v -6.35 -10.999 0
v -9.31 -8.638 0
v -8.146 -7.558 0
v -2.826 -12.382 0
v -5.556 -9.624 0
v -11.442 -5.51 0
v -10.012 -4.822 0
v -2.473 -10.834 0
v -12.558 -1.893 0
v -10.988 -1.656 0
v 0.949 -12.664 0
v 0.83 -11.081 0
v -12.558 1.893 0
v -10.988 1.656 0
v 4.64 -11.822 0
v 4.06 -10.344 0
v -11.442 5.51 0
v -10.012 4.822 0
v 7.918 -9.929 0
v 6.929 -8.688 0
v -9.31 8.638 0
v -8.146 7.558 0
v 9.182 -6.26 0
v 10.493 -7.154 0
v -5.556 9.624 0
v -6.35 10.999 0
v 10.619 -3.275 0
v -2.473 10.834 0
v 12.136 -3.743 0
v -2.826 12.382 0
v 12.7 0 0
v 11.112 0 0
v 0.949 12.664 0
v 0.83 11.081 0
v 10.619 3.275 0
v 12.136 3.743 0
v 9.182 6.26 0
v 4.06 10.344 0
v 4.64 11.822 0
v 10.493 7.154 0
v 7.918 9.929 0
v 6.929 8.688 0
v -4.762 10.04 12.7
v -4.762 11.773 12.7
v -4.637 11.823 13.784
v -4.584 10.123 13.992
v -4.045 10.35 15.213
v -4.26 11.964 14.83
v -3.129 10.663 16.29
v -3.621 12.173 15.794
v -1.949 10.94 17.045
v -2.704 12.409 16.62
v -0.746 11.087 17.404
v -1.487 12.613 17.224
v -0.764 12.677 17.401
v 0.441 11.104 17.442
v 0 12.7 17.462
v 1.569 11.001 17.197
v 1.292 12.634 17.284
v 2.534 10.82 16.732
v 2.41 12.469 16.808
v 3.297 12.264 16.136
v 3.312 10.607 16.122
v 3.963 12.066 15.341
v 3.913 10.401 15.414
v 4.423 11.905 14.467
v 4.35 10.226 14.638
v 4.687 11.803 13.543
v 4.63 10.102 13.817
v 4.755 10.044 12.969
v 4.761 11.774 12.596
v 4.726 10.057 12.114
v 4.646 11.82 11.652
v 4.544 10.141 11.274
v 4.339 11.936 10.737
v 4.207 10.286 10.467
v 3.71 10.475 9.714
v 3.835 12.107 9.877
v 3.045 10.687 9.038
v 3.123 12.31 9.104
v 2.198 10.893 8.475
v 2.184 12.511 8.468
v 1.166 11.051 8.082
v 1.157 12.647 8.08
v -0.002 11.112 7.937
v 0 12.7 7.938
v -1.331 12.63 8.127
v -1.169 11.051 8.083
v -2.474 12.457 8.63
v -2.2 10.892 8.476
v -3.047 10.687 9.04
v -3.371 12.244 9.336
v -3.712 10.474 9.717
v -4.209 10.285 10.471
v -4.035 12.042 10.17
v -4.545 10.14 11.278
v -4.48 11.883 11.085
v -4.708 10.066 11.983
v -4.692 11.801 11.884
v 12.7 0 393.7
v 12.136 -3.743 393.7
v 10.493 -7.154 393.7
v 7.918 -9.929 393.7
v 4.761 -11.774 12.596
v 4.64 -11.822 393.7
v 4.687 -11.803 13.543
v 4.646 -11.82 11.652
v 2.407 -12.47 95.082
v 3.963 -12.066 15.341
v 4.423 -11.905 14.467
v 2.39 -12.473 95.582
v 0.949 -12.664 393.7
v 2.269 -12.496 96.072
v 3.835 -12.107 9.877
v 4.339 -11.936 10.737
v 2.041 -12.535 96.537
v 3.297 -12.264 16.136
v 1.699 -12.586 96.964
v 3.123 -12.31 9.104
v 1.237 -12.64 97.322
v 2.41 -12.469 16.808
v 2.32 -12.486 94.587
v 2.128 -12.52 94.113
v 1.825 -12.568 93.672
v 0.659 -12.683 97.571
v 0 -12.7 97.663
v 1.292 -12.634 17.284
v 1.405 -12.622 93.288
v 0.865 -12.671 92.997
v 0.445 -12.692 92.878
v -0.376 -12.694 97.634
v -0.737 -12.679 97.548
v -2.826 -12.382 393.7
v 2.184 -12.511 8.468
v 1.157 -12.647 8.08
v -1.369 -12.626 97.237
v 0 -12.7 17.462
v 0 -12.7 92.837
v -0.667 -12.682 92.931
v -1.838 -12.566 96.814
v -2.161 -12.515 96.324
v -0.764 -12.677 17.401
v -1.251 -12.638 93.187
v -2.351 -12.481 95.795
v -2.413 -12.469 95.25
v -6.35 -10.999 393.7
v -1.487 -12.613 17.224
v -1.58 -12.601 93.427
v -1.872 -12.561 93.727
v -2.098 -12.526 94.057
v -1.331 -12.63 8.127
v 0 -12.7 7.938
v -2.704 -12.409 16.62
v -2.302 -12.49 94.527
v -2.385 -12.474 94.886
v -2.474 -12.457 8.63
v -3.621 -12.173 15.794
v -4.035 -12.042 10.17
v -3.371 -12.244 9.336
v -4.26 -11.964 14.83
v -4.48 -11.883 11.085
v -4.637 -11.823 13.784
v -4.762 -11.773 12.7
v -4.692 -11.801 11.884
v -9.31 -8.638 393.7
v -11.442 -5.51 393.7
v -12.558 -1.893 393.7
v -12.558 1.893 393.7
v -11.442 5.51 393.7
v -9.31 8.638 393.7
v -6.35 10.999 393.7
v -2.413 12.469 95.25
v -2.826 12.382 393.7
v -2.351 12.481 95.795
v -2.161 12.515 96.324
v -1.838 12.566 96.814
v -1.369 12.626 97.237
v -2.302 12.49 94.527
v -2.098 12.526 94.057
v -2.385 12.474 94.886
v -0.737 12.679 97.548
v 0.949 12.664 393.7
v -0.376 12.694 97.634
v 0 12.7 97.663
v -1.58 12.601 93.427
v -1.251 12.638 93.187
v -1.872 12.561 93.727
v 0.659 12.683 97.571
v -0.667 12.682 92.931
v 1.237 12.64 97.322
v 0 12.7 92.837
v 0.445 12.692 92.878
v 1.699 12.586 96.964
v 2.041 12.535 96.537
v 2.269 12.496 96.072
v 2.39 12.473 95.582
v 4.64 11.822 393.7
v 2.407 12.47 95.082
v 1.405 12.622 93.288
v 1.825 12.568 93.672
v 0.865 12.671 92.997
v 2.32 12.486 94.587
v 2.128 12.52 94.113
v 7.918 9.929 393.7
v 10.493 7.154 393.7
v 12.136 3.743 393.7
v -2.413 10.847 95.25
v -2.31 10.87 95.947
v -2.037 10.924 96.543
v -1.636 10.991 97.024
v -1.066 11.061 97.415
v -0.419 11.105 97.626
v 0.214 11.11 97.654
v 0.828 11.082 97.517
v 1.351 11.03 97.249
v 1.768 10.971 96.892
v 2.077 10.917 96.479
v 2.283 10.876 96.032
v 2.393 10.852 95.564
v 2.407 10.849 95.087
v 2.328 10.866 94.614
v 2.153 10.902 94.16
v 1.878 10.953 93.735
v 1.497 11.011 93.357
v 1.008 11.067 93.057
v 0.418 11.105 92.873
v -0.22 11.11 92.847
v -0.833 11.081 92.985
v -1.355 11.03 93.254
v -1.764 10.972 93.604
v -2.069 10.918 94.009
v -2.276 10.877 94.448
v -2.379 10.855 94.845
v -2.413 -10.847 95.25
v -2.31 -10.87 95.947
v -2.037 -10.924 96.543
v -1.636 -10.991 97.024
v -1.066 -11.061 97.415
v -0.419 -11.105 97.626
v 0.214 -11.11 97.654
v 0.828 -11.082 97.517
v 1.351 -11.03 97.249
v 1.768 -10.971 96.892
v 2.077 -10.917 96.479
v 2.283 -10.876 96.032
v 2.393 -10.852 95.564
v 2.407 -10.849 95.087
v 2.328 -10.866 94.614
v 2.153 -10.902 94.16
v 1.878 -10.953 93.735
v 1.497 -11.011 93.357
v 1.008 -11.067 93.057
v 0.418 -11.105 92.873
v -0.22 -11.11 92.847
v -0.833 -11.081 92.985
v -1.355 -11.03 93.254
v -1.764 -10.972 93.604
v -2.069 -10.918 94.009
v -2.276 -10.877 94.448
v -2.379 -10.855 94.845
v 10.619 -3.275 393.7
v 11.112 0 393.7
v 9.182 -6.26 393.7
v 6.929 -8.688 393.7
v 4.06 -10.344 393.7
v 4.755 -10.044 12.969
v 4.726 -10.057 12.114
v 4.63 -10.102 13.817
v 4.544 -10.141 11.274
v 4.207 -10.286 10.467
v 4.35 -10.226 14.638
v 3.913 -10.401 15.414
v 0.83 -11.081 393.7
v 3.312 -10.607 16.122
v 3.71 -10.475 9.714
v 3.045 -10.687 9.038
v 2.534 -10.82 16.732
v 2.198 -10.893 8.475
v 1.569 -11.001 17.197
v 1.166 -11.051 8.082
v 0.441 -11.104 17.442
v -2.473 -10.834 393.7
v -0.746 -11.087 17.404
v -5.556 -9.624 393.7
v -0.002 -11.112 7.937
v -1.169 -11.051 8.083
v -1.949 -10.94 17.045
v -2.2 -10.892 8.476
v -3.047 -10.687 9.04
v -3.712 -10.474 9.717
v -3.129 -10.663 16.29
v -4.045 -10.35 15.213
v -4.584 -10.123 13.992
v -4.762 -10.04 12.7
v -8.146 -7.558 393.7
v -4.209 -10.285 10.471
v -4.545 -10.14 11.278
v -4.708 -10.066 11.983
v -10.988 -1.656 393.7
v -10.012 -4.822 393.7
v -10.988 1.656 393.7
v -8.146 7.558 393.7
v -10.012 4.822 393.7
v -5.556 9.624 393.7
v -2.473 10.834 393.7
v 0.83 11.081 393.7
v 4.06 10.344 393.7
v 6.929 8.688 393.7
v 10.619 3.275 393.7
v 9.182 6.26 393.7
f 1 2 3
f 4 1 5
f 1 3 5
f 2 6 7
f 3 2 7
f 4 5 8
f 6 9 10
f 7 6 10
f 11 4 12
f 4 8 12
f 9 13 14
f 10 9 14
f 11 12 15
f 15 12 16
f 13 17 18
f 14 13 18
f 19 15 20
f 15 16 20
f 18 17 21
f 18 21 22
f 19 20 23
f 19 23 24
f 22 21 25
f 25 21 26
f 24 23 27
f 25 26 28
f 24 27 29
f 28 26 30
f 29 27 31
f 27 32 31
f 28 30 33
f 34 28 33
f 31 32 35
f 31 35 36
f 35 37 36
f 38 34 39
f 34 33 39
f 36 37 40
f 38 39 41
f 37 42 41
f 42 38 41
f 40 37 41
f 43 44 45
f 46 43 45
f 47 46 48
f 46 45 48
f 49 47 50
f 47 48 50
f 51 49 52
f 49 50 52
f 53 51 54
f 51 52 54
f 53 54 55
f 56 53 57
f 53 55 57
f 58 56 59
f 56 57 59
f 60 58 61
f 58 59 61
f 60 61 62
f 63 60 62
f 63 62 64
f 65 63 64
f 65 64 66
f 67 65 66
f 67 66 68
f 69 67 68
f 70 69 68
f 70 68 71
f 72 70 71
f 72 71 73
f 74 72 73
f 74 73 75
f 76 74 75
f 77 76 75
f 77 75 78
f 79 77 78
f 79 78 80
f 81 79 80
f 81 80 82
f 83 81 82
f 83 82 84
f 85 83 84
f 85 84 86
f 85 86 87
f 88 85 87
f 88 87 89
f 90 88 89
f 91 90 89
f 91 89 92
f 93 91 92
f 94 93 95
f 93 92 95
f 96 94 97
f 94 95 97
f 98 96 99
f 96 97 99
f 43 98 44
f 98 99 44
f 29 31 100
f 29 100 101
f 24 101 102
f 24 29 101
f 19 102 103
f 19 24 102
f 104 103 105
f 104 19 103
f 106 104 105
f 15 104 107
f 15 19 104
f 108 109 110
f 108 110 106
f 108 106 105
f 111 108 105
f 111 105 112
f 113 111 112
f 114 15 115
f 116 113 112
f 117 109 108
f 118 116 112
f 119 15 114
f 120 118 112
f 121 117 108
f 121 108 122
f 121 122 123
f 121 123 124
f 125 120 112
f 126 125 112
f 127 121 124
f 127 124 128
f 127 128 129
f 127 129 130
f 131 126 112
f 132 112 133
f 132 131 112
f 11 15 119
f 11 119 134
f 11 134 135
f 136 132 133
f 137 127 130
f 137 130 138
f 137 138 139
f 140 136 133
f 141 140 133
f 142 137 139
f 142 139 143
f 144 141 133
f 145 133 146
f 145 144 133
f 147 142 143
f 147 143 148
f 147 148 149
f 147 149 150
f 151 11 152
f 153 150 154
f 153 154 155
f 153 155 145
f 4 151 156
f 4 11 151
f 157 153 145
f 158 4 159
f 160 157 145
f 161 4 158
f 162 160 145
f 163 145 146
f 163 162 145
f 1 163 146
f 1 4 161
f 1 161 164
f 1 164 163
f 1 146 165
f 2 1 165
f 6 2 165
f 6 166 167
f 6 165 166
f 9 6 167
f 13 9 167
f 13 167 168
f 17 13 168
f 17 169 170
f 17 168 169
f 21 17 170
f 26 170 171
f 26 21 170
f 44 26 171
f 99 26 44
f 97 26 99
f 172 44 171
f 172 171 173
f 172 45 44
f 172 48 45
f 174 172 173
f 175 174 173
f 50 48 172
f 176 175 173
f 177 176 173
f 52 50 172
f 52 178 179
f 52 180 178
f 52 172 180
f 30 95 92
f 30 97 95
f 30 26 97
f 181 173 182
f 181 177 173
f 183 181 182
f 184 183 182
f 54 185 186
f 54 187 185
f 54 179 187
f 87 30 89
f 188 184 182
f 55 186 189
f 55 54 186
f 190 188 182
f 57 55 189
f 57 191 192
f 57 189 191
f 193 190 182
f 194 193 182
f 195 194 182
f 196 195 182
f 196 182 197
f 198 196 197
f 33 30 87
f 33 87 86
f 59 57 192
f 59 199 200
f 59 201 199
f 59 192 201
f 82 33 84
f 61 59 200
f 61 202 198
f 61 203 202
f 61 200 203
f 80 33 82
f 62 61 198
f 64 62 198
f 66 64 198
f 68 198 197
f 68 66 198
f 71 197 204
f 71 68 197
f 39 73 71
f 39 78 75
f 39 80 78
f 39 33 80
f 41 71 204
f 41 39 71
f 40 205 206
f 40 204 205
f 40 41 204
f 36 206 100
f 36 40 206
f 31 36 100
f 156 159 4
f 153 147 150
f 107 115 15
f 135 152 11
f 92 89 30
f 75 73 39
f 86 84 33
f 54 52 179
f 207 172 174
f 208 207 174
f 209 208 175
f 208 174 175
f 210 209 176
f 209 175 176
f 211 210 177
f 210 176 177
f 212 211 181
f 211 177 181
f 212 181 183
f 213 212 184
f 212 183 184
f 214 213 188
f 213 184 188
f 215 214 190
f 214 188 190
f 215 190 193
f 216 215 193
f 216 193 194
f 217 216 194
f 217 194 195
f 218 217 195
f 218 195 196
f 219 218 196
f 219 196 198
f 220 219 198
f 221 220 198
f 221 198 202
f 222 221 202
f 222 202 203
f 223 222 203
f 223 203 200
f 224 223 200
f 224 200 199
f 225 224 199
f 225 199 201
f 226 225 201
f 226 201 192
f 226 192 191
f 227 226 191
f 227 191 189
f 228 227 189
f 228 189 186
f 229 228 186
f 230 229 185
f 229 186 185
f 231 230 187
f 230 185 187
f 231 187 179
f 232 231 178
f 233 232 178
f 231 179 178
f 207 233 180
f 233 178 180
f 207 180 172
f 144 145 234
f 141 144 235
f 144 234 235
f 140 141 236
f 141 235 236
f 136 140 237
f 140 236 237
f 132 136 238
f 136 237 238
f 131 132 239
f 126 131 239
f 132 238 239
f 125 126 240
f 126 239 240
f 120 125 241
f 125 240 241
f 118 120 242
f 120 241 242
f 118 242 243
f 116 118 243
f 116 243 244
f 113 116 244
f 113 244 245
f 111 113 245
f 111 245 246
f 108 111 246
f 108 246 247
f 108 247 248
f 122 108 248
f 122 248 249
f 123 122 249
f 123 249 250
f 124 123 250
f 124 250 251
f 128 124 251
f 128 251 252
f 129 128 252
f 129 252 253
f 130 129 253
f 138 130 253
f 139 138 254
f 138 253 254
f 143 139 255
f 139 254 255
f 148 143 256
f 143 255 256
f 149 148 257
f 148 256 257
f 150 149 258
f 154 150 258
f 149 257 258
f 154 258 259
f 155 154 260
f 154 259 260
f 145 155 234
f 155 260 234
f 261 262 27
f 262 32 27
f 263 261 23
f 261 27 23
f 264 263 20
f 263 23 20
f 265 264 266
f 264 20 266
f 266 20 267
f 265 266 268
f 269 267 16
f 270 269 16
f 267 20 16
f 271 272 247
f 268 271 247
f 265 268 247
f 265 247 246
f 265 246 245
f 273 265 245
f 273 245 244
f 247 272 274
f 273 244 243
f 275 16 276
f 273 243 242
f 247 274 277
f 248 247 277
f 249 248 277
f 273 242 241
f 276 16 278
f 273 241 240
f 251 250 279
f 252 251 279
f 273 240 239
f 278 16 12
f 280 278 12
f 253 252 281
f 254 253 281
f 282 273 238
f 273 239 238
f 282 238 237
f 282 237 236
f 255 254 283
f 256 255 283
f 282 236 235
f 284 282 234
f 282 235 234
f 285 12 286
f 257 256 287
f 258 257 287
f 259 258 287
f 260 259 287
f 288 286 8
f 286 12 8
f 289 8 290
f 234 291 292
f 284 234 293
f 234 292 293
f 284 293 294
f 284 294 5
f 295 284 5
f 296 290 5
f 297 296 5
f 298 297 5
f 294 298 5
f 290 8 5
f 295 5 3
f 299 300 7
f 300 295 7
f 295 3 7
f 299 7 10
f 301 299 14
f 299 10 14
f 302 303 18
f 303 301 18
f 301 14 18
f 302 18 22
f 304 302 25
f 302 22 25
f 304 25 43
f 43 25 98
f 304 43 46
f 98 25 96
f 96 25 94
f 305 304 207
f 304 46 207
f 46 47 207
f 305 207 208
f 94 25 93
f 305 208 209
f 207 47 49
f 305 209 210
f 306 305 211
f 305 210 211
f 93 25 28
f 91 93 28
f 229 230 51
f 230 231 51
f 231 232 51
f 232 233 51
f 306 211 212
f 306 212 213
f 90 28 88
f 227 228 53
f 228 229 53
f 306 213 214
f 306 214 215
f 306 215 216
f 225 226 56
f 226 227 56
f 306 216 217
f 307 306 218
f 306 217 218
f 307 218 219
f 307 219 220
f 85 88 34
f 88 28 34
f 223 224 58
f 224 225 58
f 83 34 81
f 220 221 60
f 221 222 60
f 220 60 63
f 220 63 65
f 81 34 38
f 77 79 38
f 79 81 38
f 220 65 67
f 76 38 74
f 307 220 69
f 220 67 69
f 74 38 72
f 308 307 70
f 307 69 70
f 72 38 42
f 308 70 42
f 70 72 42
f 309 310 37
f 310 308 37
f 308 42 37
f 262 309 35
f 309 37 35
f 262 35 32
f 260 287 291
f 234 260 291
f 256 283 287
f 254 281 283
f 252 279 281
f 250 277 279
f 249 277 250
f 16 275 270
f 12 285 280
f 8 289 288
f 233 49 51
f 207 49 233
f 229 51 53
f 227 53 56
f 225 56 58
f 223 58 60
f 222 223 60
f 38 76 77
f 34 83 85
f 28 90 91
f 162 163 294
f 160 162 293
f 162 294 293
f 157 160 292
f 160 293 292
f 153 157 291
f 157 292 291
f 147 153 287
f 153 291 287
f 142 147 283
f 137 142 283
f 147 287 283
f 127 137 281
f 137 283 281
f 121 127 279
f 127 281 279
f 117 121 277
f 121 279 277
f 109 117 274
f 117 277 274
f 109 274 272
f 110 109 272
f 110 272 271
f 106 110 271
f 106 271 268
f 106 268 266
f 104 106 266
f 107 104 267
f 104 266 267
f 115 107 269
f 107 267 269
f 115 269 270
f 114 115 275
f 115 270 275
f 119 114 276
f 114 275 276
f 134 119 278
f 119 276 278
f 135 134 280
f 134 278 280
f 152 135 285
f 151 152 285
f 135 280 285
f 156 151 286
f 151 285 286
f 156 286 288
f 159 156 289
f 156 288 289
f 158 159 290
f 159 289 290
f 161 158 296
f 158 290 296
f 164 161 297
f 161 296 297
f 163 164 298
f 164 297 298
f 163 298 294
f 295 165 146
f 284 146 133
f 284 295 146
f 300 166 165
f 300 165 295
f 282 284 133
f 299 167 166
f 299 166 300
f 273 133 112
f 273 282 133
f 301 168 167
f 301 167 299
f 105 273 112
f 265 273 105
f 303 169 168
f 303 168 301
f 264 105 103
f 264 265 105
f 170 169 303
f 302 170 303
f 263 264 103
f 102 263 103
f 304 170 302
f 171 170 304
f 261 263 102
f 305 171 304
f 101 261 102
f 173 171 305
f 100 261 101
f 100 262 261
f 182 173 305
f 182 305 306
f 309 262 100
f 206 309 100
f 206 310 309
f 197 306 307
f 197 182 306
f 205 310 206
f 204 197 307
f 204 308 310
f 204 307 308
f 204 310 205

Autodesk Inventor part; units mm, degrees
ref_plane "YZ Plane" through (0, 0, 0) normal (1, 0, 0) x (0, 1, 0)
ref_plane "XY Plane" through (0, 0, 0) normal (0, 0, 1) x (1, 0, 0)
sketch "Sketch1" plane through (0, 0, 0) normal (0, 0, 1) x (1, 0, 0)
  circle A0 centre (0, 0) radius 12.7
  circle A1 centre (0, 0) radius 11.1125
  dimension "d0" = 25.4
  dimension "d1" = 22.225
extrude "Extrusion1" add sketch "Sketch1" along normal blind 393.7
ref_plane "Work Plane1" through (0, 12.7, 0) normal (0, 1, 0) x (-1, 0, 0)
sketch "Sketch2" plane through (0, 12.7, 0) normal (0, 1, 0) x (-1, 0, 0)
  line L0 (-12.7, 0) -> (-12.7, 393.7) projected
  line L1 (-12.7, 0) -> (12.7, 0) projected
  line L2 (12.7, 0) -> (12.7, 393.7) projected
  circle A0 centre (0, 12.7) radius 4.7625
  line L3 (0, 0) -> (0, 58.059) construction
  circle A1 centre (0, 95.25) radius 2.413
  dimension "d4" = 9.525
  dimension "d6" = 12.7
  dimension "d10" = 4.826
  dimension "d11" = 95.25
extrude "Extrusion2" cut sketch "Sketch2" against normal blind 25.4
properties part number "Polycarbonate Clamp Tube 1 in OD (8585K14)" material "Polycarbonate, Clear"
